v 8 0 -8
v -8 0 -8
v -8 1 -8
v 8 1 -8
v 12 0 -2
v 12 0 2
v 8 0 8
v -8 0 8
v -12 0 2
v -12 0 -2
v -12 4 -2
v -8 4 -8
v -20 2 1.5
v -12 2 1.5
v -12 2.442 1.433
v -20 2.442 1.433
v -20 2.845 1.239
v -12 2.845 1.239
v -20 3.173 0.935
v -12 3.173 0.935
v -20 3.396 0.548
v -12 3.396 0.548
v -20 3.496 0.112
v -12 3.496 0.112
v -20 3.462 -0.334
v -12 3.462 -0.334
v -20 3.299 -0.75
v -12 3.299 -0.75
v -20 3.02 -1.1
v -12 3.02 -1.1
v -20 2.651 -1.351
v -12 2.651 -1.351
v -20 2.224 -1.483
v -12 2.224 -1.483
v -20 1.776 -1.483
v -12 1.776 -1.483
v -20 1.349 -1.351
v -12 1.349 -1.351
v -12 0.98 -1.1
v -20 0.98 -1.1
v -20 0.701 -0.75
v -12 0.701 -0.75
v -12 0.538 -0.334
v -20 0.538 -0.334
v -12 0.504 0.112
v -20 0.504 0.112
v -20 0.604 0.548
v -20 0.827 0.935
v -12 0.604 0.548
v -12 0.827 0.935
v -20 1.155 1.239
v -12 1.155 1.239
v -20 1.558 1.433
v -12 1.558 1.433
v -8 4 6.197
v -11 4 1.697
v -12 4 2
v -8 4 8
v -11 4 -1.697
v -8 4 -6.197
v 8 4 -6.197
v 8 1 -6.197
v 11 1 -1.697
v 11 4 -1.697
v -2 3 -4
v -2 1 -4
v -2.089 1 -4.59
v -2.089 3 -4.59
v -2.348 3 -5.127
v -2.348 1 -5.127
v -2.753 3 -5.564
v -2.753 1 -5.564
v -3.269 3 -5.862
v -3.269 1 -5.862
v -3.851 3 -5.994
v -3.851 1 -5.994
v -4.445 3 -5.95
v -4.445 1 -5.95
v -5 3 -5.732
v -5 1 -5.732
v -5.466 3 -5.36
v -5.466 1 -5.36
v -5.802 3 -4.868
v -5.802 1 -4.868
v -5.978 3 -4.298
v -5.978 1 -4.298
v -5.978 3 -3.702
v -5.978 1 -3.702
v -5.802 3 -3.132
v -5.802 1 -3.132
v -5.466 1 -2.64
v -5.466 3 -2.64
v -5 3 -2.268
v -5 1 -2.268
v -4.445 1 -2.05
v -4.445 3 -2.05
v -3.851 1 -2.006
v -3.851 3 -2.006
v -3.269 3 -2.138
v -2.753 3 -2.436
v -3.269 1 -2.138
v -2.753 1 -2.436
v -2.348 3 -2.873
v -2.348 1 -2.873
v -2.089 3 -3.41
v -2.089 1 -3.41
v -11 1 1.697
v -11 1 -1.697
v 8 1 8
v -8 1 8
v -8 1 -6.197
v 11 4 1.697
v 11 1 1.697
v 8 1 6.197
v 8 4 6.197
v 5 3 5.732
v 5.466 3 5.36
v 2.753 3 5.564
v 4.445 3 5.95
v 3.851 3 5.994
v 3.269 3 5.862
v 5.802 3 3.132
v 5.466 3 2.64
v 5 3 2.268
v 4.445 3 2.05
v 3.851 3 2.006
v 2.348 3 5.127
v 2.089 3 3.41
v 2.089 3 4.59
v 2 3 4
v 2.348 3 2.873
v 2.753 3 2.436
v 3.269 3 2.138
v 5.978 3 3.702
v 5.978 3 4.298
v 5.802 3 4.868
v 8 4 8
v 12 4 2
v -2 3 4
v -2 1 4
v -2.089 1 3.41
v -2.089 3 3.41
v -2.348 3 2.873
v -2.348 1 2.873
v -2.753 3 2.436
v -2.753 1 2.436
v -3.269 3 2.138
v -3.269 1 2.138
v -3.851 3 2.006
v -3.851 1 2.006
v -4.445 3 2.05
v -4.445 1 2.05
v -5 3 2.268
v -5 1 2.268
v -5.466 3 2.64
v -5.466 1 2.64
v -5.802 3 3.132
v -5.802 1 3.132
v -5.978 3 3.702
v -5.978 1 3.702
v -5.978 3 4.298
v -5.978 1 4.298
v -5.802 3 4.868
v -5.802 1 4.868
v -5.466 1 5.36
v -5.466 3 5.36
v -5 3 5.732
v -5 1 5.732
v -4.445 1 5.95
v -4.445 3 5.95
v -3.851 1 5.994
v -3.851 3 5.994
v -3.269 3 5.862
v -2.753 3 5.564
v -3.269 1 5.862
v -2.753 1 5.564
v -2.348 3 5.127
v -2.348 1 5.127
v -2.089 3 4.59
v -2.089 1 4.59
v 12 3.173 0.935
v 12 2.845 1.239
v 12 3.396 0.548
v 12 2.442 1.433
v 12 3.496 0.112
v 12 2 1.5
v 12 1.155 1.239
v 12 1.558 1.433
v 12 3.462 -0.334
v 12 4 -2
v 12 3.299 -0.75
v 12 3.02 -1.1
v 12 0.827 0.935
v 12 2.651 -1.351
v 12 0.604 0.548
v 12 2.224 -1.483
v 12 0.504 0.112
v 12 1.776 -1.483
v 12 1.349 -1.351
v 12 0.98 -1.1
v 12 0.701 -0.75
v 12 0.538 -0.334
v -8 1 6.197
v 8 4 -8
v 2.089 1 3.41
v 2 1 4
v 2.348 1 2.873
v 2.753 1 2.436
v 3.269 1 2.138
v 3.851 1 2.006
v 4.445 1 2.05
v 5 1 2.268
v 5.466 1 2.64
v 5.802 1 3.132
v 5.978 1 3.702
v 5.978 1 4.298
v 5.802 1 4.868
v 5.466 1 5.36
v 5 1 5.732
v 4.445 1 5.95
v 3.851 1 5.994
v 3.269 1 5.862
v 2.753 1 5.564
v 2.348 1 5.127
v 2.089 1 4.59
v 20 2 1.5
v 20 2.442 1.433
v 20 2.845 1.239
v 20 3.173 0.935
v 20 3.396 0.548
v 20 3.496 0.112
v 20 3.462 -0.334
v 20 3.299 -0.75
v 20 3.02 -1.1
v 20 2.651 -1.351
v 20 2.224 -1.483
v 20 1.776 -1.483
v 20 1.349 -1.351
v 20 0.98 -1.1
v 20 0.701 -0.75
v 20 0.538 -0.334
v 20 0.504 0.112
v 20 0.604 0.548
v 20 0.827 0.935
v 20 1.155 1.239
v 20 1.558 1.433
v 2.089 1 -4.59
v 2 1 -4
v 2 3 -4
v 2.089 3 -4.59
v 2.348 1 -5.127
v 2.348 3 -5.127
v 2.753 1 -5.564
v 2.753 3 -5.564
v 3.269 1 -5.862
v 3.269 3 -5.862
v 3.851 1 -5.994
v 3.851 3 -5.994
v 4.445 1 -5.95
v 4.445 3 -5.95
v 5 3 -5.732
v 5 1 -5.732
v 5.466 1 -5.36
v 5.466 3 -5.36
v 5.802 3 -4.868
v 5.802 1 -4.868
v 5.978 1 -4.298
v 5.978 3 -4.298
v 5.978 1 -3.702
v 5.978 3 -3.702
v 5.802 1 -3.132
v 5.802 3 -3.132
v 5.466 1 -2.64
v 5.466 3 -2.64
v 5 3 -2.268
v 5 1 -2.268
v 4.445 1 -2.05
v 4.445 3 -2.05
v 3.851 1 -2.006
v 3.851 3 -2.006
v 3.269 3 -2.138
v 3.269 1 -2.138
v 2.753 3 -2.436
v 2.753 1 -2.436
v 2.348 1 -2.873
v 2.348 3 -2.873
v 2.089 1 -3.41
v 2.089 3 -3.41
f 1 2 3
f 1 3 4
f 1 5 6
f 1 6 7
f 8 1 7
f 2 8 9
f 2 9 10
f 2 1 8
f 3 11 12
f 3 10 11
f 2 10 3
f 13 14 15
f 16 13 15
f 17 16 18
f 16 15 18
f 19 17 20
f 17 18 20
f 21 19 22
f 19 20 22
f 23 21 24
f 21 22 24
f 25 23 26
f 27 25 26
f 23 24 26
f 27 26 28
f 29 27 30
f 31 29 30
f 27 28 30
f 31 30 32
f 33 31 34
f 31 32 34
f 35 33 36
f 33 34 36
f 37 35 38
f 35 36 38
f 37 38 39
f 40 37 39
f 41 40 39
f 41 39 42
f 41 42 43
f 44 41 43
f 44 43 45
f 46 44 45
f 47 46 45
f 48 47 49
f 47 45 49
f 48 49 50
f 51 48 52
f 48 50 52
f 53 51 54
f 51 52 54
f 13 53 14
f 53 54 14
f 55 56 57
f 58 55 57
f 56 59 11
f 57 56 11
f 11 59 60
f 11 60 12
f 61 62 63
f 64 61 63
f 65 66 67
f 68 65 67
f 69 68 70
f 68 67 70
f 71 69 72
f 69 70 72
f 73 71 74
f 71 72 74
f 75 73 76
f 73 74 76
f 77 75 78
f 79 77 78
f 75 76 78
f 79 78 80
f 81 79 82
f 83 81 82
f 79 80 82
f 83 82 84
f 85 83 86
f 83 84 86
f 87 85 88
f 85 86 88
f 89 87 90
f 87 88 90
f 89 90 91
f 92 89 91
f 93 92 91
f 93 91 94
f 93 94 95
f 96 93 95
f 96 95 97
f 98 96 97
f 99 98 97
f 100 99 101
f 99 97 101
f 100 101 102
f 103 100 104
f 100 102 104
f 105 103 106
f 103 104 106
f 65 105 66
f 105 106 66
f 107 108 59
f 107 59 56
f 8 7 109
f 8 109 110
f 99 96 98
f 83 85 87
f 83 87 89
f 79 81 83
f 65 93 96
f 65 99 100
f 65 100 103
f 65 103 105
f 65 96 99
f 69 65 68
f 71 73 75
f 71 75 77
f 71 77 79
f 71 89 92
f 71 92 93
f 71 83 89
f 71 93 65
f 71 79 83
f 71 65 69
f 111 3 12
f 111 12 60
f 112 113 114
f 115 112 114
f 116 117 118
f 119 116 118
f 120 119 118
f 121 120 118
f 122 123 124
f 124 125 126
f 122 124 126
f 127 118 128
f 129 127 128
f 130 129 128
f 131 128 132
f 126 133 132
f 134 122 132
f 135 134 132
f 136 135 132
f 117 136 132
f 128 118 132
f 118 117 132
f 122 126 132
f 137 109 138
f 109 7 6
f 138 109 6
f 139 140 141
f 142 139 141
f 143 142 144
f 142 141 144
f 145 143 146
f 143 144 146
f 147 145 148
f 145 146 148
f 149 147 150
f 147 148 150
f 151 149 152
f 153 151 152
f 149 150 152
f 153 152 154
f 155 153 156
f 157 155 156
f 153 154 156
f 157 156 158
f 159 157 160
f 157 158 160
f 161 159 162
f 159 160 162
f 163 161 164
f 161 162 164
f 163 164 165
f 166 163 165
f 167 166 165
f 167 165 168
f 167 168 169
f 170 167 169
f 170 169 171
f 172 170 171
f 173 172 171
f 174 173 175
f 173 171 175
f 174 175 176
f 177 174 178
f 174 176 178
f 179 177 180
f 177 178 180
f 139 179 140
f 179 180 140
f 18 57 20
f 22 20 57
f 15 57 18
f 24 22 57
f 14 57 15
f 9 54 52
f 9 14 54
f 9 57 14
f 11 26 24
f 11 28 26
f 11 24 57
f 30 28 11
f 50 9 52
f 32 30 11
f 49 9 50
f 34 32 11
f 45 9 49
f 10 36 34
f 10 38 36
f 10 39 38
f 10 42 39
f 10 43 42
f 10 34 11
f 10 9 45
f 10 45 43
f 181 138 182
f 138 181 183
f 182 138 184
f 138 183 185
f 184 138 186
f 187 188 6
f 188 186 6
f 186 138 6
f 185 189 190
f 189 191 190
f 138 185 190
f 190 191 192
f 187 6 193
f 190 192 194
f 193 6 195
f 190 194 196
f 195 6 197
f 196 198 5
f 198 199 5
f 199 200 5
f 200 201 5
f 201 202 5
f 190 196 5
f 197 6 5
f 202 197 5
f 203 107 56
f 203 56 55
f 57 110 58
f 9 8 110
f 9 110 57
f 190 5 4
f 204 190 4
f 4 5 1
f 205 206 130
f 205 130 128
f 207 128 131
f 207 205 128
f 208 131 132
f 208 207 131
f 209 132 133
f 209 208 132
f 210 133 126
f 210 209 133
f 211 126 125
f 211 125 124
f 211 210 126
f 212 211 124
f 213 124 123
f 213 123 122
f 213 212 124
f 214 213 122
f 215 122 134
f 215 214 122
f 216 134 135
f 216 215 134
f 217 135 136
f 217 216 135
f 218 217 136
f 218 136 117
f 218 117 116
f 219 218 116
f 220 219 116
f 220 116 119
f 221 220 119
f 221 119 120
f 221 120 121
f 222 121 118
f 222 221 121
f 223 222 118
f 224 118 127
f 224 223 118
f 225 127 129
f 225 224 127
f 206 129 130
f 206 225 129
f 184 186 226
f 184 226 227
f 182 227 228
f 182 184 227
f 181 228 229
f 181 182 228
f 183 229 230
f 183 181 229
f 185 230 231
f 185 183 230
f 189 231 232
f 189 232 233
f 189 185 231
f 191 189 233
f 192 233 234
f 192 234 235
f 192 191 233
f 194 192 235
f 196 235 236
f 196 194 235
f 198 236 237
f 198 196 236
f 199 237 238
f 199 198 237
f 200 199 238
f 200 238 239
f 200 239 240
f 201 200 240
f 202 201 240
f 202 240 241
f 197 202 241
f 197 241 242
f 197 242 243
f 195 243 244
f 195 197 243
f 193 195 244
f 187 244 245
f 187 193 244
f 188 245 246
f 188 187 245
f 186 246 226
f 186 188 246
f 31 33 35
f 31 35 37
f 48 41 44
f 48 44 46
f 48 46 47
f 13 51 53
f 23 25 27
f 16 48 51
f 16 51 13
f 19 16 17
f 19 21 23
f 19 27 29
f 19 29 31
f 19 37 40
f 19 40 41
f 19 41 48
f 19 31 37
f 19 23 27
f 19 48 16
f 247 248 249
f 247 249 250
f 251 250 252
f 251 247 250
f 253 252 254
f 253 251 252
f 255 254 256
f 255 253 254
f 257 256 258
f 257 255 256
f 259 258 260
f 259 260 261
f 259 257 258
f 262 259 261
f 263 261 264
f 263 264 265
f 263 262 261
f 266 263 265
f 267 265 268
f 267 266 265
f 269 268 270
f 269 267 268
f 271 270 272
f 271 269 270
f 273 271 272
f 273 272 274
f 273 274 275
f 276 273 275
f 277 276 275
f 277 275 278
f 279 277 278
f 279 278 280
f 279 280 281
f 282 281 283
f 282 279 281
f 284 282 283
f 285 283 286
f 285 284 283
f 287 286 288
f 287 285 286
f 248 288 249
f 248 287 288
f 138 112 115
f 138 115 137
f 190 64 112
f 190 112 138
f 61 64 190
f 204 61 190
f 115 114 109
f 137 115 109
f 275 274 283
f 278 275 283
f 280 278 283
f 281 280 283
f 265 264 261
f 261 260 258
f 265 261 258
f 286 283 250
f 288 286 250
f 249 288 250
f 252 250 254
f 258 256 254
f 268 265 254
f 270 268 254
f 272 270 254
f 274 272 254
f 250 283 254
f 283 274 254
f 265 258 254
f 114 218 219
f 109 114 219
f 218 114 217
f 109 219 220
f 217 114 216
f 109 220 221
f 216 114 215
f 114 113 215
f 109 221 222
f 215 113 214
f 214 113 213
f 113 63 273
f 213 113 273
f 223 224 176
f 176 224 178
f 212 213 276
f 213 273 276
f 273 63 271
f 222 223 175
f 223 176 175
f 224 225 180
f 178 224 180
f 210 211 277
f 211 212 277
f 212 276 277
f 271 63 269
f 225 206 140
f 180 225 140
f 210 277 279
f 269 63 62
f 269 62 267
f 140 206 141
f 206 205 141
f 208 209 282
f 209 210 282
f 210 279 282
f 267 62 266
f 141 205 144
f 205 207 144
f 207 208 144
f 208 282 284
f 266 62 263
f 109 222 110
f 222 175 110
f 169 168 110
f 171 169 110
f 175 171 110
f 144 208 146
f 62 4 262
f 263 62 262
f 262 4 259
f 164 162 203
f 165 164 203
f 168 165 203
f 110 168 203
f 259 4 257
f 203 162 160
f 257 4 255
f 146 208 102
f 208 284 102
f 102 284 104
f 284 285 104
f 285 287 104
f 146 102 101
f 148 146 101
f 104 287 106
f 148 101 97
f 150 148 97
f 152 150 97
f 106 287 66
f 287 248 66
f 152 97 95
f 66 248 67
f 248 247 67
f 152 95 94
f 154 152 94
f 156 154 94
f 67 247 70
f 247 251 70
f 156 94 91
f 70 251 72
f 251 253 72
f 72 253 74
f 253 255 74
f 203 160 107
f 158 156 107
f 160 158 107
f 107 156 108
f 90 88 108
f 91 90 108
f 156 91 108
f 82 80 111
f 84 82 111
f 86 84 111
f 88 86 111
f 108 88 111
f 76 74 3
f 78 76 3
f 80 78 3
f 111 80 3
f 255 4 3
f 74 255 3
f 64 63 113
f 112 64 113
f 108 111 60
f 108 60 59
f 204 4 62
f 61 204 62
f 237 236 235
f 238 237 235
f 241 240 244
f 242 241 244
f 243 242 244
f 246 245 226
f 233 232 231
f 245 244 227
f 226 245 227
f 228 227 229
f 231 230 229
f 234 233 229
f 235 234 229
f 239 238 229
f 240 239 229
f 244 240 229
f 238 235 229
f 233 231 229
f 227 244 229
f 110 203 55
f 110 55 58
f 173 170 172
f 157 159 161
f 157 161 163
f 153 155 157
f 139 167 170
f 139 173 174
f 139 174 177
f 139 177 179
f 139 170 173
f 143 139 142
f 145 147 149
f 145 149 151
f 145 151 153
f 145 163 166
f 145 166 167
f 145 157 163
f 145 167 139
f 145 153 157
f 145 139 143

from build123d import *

# Parameters (mm, degrees)
BOSS_EXTRUDE1_DEPTH = 1
SKETCH2_R           = 2
BOSS_EXTRUDE2_DEPTH = 2
BOSS_EXTRUDE3_DEPTH = 3
SKETCH5_R           = 1.5
BOSS_EXTRUDE4_DEPTH = 8


with BuildPart() as part:
    # Sketch1 → Boss-Extrude1 (new body)
    with BuildSketch(Plane(origin=(0, 0, 0), x_dir=(1, 0, 0), z_dir=(0, 1, 0))):
        Polygon((0, -8), (0, 8), (-8, 8), (-12, 2), (-12, -2), (-8, -8), align=None)
    boss_extrude1 = extrude(amount=BOSS_EXTRUDE1_DEPTH)

    # Sketch2 → Boss-Extrude2 (add)
    with BuildSketch(Plane(origin=(0, 1, 0), x_dir=(1, 0, 0), z_dir=(0, 1, 0))):
        with Locations((-4, 4)):
            Circle(SKETCH2_R)
        with Locations((-4, -4)):
            Circle(SKETCH2_R)
    boss_extrude2 = extrude(amount=BOSS_EXTRUDE2_DEPTH)

    # Sketch3 → Boss-Extrude3 (add)
    with BuildSketch(Plane(origin=(0, 1, 0), x_dir=(1, 0, 0), z_dir=(0, 1, 0))):
        Polygon((-8, 6.197224362), (-11, 1.697224362), (-11, -1.697224362), (-8, -6.197224362), (-8, -8), (-12, -2), (-12, 2), (-8, 8), align=None)
    boss_extrude3 = extrude(amount=BOSS_EXTRUDE3_DEPTH)

    # Sketch5 → Boss-Extrude4 (add)
    with BuildSketch(Plane.ZY.offset(12)):
        with Locations((0, 2)):
            Circle(SKETCH5_R)
    boss_extrude4 = extrude(amount=BOSS_EXTRUDE4_DEPTH)

    # Mirror1: Boss-Extrude1, Boss-Extrude2, Boss-Extrude3, Boss-Extrude4 across plane
    add(boss_extrude1.mirror(Plane(origin=(0, 1, 8), x_dir=(0, 0, 1), z_dir=(-1, 0, 0))))
    add(boss_extrude2.mirror(Plane(origin=(0, 1, 8), x_dir=(0, 0, 1), z_dir=(-1, 0, 0))))
    add(boss_extrude3.mirror(Plane(origin=(0, 1, 8), x_dir=(0, 0, 1), z_dir=(-1, 0, 0))))
    add(boss_extrude4.mirror(Plane(origin=(0, 1, 8), x_dir=(0, 0, 1), z_dir=(-1, 0, 0))))


solid = part.part
